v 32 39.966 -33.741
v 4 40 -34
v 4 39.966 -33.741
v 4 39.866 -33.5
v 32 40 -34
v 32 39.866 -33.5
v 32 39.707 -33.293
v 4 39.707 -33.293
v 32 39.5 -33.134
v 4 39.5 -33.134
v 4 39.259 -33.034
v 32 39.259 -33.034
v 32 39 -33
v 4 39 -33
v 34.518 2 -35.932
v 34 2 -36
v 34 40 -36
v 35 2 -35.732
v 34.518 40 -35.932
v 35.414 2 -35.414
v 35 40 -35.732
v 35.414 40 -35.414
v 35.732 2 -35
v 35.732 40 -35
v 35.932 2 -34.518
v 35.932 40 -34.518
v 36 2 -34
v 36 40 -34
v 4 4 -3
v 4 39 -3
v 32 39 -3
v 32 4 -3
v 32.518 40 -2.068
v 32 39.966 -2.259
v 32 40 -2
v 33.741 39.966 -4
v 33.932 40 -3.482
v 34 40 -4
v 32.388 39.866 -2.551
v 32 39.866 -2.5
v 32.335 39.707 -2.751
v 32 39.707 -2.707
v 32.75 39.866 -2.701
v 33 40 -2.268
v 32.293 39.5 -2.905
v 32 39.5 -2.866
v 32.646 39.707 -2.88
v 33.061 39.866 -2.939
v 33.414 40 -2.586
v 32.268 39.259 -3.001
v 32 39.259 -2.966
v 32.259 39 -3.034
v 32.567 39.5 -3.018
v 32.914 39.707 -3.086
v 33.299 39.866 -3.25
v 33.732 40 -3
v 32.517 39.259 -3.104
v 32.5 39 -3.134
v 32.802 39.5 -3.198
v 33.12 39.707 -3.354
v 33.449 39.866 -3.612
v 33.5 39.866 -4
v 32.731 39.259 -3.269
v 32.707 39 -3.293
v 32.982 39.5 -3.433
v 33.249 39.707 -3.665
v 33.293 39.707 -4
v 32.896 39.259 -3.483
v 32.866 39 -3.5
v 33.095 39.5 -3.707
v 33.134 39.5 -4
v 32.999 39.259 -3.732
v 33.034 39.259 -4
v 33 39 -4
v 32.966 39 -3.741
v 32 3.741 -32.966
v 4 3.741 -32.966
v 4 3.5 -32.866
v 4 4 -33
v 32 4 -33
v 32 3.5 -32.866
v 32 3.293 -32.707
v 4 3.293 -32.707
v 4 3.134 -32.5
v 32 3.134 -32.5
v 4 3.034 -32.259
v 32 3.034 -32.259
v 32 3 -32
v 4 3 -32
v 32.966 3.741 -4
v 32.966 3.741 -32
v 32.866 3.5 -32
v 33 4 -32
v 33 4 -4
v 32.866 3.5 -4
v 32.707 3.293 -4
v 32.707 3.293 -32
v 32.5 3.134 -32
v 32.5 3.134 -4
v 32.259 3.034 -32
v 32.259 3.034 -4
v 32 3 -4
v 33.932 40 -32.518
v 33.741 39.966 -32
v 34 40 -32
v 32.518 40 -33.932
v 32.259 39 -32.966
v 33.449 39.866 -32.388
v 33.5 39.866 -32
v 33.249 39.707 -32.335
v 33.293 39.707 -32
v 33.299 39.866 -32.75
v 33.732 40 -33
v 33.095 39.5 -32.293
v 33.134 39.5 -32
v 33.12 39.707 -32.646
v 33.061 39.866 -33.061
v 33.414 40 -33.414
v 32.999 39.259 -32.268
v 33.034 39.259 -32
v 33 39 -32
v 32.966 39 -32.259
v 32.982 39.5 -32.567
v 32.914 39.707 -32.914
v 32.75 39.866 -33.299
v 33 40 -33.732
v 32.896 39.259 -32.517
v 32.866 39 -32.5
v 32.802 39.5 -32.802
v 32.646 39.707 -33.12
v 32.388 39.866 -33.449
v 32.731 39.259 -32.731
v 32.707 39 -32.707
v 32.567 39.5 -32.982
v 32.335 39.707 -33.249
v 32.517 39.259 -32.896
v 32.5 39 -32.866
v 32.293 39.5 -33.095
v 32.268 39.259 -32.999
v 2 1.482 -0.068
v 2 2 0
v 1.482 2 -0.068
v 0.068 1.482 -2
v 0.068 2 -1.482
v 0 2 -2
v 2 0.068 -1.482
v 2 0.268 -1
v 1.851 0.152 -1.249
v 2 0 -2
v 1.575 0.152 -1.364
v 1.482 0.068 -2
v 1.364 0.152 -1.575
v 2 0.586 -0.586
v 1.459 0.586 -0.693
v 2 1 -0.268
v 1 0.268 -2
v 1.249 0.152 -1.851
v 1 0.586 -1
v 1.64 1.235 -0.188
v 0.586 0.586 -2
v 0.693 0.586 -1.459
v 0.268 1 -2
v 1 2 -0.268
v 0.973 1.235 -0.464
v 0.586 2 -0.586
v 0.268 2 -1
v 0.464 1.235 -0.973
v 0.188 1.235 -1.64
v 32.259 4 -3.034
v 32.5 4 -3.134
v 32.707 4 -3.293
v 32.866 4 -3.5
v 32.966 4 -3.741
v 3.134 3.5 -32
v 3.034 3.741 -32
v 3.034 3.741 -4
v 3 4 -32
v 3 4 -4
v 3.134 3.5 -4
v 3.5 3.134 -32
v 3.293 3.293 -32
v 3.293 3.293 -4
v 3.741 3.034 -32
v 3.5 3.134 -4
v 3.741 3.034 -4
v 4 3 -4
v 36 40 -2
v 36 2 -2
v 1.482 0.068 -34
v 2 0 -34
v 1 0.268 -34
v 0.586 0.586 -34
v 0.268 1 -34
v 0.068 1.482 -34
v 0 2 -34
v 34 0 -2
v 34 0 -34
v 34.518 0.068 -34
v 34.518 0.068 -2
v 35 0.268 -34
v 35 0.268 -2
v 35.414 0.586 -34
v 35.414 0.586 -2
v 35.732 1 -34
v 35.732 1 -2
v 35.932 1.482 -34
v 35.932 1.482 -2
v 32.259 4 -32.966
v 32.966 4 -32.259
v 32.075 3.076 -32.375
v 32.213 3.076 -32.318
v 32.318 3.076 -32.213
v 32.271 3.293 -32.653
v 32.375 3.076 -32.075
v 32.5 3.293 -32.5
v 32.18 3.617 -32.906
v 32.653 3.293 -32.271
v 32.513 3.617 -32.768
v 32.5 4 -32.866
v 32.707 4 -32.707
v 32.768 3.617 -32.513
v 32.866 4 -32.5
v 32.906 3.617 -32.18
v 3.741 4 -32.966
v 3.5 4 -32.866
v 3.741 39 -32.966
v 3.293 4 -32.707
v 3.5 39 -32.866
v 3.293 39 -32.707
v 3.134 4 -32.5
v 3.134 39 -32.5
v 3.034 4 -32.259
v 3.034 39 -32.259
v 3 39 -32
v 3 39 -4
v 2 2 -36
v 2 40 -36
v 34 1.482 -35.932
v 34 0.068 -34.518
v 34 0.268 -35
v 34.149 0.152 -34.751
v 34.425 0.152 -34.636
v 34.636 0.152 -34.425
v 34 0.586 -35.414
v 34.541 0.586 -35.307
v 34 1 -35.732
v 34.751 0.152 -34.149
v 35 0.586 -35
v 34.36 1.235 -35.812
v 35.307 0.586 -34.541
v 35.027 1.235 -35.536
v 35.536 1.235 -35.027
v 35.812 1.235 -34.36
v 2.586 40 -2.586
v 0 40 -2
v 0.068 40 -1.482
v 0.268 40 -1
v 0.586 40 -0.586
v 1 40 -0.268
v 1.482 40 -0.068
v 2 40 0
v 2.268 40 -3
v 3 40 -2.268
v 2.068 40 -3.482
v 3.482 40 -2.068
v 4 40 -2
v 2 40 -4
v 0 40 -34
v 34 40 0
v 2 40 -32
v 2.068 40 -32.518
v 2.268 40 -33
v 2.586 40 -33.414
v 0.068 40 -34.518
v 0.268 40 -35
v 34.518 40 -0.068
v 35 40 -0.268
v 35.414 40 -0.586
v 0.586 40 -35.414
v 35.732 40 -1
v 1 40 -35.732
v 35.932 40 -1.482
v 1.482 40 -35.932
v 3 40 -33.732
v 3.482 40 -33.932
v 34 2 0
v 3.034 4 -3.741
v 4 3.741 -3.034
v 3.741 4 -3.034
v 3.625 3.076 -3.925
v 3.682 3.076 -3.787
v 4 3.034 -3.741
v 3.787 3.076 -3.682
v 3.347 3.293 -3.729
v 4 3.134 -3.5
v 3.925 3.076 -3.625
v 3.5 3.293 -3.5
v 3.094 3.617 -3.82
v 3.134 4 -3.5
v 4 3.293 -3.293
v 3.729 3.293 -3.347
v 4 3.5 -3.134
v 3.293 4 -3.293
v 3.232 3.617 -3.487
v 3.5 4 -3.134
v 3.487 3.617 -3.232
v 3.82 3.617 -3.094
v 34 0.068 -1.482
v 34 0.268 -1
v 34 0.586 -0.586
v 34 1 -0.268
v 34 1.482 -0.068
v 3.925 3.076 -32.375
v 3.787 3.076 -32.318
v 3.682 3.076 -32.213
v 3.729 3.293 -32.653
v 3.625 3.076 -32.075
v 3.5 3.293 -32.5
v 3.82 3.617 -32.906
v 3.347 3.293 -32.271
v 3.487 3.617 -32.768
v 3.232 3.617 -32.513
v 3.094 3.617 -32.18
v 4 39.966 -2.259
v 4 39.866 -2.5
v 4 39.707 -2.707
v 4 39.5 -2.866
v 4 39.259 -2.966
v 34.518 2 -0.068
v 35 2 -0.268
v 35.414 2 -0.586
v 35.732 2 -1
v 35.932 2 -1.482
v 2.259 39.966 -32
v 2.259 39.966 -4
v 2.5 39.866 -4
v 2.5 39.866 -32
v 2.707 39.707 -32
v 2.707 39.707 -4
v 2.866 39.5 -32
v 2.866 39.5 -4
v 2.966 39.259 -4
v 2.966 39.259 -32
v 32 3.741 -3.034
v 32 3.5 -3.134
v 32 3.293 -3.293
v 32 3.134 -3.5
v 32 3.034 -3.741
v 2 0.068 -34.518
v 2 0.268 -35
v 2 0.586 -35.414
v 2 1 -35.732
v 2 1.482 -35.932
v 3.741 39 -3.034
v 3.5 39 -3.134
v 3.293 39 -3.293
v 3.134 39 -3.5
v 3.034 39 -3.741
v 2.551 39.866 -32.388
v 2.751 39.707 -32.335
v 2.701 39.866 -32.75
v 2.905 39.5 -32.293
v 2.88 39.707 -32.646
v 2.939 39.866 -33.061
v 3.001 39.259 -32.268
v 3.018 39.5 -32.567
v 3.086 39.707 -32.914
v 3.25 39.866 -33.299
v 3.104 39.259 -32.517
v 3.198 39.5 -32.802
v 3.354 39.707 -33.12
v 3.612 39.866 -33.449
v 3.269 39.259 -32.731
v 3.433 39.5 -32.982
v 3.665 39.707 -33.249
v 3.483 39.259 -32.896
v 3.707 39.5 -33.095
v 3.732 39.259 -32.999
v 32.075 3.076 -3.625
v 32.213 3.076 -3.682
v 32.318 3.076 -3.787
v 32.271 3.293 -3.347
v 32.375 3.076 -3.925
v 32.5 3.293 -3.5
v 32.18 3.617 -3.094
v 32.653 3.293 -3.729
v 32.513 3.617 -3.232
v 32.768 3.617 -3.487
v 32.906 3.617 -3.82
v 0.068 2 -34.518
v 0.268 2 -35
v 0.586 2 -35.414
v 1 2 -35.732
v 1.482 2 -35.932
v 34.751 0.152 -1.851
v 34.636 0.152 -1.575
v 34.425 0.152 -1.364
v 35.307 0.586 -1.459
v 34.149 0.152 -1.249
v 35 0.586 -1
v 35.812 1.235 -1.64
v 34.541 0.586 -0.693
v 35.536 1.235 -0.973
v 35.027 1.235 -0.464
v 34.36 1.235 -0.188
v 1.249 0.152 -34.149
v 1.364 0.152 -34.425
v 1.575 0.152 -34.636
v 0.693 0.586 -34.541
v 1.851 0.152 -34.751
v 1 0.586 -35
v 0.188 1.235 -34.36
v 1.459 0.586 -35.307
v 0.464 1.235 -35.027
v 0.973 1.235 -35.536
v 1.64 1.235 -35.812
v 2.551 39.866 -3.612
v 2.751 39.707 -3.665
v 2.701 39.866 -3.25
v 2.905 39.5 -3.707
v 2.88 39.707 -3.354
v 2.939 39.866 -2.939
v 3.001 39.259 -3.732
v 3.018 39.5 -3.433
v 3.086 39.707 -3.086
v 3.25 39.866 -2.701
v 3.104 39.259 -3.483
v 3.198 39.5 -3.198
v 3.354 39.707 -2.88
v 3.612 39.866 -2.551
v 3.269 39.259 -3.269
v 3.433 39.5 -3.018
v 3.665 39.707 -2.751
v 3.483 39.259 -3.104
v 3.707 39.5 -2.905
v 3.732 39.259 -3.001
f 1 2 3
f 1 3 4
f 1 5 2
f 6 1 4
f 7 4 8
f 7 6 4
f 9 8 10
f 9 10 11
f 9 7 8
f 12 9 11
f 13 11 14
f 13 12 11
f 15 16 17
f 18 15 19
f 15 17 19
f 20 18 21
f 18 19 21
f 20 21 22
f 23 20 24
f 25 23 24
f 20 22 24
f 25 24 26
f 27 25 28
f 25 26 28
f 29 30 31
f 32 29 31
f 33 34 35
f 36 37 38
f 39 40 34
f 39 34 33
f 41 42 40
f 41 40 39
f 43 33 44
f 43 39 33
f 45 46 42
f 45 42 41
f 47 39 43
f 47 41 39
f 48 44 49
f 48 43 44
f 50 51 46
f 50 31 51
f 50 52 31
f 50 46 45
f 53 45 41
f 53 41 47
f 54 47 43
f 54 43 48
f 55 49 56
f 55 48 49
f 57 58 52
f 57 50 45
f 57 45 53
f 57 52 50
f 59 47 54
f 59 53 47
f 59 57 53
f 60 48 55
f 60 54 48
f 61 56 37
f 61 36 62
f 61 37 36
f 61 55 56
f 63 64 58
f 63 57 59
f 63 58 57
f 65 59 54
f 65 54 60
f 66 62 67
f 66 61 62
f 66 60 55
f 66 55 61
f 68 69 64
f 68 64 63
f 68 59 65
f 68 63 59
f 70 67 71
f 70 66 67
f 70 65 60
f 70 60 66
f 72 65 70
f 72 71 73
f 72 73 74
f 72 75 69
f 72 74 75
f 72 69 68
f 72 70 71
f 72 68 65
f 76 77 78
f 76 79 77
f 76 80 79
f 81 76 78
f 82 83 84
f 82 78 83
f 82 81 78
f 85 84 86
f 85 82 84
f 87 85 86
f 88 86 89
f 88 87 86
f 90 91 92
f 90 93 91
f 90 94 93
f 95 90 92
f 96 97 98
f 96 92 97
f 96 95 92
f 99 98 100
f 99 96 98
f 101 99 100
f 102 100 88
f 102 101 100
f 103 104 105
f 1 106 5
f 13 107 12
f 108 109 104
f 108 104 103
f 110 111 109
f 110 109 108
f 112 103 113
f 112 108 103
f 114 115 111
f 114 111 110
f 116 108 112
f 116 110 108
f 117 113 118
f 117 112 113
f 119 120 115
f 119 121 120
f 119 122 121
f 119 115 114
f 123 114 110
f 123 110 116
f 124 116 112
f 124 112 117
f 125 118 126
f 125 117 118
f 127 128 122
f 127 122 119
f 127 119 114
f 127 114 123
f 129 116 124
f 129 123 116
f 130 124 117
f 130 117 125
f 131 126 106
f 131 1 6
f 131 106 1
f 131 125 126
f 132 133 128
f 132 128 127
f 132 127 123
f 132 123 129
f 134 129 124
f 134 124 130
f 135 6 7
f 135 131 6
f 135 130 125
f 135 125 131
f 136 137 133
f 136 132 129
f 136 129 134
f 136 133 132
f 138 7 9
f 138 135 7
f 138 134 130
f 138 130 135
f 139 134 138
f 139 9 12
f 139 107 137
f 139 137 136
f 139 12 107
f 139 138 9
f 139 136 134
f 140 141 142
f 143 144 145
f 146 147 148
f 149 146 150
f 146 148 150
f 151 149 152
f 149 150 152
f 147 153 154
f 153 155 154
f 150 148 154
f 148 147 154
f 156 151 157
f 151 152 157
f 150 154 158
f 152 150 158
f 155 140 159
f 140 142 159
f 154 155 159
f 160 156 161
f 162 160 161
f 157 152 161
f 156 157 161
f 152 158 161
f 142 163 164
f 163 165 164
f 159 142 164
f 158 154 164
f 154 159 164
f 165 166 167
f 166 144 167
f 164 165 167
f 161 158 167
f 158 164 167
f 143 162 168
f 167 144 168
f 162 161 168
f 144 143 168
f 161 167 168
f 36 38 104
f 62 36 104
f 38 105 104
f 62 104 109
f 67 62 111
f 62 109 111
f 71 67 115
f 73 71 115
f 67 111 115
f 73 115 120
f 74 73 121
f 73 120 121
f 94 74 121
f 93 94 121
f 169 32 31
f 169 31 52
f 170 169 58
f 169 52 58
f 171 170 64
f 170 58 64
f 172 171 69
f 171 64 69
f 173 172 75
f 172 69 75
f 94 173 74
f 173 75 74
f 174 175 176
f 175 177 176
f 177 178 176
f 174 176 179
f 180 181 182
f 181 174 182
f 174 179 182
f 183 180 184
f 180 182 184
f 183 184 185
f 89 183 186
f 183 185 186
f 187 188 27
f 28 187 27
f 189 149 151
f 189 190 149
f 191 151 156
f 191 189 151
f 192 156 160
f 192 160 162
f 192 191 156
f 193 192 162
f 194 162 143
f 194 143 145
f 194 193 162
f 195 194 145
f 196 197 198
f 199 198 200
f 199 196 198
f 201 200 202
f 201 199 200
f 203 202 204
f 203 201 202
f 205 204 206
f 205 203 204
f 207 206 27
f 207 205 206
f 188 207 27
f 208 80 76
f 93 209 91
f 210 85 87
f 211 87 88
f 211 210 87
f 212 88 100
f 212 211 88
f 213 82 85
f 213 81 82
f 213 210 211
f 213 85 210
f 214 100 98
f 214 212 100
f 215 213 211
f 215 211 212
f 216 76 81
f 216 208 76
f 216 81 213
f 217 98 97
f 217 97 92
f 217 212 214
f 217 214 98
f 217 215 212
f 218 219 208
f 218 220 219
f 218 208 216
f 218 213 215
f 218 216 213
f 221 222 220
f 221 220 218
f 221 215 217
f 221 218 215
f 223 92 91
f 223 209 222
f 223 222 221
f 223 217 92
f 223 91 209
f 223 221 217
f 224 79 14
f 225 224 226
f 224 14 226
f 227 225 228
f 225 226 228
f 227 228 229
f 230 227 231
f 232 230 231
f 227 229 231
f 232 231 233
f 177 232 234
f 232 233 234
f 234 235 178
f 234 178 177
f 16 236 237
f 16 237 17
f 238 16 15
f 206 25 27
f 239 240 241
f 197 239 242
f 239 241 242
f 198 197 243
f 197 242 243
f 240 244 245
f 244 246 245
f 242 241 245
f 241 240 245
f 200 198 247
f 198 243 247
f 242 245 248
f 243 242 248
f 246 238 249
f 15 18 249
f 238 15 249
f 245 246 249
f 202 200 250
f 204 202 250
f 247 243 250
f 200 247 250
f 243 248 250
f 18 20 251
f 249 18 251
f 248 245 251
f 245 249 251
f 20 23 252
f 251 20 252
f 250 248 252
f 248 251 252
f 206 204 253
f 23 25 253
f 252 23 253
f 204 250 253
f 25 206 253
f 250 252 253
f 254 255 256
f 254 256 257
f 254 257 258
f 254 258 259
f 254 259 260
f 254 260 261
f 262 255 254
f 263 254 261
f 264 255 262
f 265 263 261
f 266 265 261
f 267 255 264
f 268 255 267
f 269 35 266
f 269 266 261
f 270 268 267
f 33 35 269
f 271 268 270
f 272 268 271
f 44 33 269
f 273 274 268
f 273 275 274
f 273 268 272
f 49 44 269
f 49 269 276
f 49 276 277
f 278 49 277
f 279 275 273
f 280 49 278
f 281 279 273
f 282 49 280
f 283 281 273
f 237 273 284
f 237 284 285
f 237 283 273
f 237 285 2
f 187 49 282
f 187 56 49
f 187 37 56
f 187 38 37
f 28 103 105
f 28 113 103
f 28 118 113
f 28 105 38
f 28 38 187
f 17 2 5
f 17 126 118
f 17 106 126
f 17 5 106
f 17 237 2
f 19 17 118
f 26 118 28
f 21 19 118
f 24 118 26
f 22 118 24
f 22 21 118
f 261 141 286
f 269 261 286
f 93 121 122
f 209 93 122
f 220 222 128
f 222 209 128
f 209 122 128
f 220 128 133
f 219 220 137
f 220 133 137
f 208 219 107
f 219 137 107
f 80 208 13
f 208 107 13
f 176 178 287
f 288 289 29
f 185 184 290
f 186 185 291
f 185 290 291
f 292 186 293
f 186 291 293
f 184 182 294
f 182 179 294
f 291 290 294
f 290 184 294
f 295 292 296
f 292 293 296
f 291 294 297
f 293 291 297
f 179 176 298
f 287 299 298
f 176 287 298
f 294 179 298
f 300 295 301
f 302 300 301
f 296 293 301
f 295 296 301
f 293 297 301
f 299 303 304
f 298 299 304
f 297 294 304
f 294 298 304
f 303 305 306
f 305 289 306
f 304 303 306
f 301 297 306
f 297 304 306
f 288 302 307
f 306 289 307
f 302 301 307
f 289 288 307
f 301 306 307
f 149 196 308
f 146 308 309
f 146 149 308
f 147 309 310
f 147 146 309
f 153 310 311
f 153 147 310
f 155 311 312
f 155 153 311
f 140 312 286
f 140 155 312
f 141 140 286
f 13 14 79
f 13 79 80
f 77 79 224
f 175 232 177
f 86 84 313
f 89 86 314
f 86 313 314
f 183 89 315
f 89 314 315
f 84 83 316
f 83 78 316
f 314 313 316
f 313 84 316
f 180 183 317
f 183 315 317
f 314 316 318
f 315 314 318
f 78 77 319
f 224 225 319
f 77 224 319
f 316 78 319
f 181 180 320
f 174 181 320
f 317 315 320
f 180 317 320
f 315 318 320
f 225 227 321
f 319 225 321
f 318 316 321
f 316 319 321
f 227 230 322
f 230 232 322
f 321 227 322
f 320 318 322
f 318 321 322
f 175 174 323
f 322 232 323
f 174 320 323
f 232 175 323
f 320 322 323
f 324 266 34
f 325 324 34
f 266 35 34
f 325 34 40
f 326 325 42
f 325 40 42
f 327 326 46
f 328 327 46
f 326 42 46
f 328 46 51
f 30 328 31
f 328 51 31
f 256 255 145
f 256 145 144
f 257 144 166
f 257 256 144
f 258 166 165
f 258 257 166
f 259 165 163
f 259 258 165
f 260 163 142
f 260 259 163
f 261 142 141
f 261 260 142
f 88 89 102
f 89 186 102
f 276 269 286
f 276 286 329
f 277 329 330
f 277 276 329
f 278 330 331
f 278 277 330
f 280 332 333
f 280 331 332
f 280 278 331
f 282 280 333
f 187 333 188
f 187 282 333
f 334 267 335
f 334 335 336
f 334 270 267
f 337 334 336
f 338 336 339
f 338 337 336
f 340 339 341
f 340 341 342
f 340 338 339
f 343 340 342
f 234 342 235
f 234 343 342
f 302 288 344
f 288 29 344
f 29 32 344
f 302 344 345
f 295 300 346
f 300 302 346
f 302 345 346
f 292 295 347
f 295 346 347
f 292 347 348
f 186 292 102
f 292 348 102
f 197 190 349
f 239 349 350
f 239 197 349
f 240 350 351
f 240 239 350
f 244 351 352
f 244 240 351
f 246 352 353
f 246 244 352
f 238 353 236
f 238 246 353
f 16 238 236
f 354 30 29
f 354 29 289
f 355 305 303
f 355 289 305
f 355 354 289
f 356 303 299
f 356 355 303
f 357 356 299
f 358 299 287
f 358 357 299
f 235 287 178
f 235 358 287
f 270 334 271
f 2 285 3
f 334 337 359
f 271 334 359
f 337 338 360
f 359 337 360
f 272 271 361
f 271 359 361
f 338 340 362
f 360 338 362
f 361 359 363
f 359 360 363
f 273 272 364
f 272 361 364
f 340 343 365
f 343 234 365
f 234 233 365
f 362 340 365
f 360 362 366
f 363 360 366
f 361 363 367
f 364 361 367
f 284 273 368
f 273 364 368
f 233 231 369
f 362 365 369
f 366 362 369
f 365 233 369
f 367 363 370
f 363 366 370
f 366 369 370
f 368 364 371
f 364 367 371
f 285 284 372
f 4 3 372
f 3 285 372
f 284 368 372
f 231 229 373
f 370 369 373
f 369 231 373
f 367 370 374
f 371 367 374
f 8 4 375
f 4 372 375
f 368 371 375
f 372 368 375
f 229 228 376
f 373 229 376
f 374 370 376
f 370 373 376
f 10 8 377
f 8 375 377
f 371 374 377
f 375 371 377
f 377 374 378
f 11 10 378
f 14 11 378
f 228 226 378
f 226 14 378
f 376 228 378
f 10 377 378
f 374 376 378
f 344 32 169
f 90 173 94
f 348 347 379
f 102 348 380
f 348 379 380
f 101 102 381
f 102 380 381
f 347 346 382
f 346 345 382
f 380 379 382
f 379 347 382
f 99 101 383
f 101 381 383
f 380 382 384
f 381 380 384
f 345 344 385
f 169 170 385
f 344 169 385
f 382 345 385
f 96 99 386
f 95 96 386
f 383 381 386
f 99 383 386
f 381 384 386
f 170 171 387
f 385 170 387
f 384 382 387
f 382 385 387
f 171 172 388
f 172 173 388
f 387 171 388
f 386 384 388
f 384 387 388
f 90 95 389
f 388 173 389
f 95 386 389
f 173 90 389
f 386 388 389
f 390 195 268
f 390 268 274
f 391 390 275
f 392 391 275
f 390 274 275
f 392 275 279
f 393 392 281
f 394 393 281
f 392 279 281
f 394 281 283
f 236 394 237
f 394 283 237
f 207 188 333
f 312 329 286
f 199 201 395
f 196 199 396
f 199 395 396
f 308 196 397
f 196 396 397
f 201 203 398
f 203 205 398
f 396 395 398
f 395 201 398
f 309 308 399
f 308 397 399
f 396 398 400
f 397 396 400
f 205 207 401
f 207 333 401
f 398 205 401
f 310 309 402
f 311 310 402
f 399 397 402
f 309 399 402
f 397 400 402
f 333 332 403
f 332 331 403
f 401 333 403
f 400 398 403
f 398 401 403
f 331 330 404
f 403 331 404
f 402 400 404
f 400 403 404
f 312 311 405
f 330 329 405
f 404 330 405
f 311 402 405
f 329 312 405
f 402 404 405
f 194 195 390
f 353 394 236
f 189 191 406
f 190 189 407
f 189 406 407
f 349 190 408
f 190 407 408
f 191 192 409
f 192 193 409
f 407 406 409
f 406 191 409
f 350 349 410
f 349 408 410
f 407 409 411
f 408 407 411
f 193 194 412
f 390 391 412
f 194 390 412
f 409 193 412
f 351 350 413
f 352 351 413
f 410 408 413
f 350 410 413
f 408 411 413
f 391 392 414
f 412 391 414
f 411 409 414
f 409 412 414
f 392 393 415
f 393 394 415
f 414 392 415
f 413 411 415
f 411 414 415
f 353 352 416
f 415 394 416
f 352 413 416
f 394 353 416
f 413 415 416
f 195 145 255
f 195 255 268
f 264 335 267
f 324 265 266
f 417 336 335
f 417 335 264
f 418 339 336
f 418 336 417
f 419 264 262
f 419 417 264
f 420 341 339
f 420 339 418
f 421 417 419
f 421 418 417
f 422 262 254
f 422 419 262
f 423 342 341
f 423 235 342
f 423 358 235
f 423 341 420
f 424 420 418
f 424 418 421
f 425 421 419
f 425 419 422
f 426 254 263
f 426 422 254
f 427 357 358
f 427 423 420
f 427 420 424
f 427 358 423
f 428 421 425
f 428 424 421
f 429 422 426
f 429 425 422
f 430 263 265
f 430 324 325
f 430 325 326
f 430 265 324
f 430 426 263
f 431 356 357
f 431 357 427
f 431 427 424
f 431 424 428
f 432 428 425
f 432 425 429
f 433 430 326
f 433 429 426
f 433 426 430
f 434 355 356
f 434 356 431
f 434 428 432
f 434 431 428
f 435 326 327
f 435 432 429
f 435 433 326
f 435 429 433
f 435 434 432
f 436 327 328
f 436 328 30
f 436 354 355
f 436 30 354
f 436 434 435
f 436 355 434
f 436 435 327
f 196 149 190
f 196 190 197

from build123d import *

# Parameters (mm, degrees)
SKETCH1_W           = 36
SKETCH1_H           = 36
SKETCH1_W_2         = 30
SKETCH1_H_2         = 30
BOSS_EXTRUDE1_DEPTH = 40
SKETCH2_W           = 30
SKETCH2_H           = 30
BOSS_EXTRUDE2_DEPTH = 3
FILLET_1_R          = 2
FILLET_2_R          = 2
FILLET_3_R          = 1


with BuildPart() as part:
    # Sketch1 → Boss-Extrude1 (new body)
    with BuildSketch(Plane(origin=(0, 0, 0), x_dir=(1, 0, 0), z_dir=(0, 1, 0))):
        with Locations((18, 18)):
            Rectangle(SKETCH1_W, SKETCH1_H)
        with Locations((18, 18)):
            Rectangle(SKETCH1_W_2, SKETCH1_H_2, mode=Mode.SUBTRACT)
    extrude(amount=BOSS_EXTRUDE1_DEPTH)

    # Sketch2 → Boss-Extrude2 (add)
    with BuildSketch(Plane.XZ):
        with Locations((18, -18)):
            Rectangle(SKETCH2_W, SKETCH2_H)
    extrude(amount=-BOSS_EXTRUDE2_DEPTH)

    # Скругление1
    fillet_1_edges = [part.edges().sort_by_distance(p)[0] for p in [
        (0, 20, -36),
        (36, 20, -36),
        (36, 20, 0),
        (0, 20, 0),
    ]]
    fillet(fillet_1_edges, radius=FILLET_1_R)

    # Скругление2
    fillet_2_edges = [part.edges().sort_by_distance(p)[0] for p in [
        (0, 0, -18),
        (18, 0, -36),
        (36, 0, -18),
        (18, 0, 0),
        (35.414213562, 0, -0.585786438),
        (35.414213562, 0, -35.414213562),
        (0.585786438, 0, -0.585786438),
        (0.585786438, 0, -35.414213562),
    ]]
    fillet(fillet_2_edges, radius=FILLET_2_R)

    # Скругление3
    fillet_3_edges = [part.edges().sort_by_distance(p)[0] for p in [
        (3, 21.5, -33),
        (3, 21.5, -3),
        (33, 21.5, -3),
        (33, 21.5, -33),
        (3, 40, -18),
        (18, 40, -3),
        (33, 40, -18),
        (18, 40, -33),
        (18, 3, -33),
        (3, 3, -18),
        (18, 3, -3),
        (33, 3, -18),
    ]]
    fillet(fillet_3_edges, radius=FILLET_3_R)


solid = part.part
